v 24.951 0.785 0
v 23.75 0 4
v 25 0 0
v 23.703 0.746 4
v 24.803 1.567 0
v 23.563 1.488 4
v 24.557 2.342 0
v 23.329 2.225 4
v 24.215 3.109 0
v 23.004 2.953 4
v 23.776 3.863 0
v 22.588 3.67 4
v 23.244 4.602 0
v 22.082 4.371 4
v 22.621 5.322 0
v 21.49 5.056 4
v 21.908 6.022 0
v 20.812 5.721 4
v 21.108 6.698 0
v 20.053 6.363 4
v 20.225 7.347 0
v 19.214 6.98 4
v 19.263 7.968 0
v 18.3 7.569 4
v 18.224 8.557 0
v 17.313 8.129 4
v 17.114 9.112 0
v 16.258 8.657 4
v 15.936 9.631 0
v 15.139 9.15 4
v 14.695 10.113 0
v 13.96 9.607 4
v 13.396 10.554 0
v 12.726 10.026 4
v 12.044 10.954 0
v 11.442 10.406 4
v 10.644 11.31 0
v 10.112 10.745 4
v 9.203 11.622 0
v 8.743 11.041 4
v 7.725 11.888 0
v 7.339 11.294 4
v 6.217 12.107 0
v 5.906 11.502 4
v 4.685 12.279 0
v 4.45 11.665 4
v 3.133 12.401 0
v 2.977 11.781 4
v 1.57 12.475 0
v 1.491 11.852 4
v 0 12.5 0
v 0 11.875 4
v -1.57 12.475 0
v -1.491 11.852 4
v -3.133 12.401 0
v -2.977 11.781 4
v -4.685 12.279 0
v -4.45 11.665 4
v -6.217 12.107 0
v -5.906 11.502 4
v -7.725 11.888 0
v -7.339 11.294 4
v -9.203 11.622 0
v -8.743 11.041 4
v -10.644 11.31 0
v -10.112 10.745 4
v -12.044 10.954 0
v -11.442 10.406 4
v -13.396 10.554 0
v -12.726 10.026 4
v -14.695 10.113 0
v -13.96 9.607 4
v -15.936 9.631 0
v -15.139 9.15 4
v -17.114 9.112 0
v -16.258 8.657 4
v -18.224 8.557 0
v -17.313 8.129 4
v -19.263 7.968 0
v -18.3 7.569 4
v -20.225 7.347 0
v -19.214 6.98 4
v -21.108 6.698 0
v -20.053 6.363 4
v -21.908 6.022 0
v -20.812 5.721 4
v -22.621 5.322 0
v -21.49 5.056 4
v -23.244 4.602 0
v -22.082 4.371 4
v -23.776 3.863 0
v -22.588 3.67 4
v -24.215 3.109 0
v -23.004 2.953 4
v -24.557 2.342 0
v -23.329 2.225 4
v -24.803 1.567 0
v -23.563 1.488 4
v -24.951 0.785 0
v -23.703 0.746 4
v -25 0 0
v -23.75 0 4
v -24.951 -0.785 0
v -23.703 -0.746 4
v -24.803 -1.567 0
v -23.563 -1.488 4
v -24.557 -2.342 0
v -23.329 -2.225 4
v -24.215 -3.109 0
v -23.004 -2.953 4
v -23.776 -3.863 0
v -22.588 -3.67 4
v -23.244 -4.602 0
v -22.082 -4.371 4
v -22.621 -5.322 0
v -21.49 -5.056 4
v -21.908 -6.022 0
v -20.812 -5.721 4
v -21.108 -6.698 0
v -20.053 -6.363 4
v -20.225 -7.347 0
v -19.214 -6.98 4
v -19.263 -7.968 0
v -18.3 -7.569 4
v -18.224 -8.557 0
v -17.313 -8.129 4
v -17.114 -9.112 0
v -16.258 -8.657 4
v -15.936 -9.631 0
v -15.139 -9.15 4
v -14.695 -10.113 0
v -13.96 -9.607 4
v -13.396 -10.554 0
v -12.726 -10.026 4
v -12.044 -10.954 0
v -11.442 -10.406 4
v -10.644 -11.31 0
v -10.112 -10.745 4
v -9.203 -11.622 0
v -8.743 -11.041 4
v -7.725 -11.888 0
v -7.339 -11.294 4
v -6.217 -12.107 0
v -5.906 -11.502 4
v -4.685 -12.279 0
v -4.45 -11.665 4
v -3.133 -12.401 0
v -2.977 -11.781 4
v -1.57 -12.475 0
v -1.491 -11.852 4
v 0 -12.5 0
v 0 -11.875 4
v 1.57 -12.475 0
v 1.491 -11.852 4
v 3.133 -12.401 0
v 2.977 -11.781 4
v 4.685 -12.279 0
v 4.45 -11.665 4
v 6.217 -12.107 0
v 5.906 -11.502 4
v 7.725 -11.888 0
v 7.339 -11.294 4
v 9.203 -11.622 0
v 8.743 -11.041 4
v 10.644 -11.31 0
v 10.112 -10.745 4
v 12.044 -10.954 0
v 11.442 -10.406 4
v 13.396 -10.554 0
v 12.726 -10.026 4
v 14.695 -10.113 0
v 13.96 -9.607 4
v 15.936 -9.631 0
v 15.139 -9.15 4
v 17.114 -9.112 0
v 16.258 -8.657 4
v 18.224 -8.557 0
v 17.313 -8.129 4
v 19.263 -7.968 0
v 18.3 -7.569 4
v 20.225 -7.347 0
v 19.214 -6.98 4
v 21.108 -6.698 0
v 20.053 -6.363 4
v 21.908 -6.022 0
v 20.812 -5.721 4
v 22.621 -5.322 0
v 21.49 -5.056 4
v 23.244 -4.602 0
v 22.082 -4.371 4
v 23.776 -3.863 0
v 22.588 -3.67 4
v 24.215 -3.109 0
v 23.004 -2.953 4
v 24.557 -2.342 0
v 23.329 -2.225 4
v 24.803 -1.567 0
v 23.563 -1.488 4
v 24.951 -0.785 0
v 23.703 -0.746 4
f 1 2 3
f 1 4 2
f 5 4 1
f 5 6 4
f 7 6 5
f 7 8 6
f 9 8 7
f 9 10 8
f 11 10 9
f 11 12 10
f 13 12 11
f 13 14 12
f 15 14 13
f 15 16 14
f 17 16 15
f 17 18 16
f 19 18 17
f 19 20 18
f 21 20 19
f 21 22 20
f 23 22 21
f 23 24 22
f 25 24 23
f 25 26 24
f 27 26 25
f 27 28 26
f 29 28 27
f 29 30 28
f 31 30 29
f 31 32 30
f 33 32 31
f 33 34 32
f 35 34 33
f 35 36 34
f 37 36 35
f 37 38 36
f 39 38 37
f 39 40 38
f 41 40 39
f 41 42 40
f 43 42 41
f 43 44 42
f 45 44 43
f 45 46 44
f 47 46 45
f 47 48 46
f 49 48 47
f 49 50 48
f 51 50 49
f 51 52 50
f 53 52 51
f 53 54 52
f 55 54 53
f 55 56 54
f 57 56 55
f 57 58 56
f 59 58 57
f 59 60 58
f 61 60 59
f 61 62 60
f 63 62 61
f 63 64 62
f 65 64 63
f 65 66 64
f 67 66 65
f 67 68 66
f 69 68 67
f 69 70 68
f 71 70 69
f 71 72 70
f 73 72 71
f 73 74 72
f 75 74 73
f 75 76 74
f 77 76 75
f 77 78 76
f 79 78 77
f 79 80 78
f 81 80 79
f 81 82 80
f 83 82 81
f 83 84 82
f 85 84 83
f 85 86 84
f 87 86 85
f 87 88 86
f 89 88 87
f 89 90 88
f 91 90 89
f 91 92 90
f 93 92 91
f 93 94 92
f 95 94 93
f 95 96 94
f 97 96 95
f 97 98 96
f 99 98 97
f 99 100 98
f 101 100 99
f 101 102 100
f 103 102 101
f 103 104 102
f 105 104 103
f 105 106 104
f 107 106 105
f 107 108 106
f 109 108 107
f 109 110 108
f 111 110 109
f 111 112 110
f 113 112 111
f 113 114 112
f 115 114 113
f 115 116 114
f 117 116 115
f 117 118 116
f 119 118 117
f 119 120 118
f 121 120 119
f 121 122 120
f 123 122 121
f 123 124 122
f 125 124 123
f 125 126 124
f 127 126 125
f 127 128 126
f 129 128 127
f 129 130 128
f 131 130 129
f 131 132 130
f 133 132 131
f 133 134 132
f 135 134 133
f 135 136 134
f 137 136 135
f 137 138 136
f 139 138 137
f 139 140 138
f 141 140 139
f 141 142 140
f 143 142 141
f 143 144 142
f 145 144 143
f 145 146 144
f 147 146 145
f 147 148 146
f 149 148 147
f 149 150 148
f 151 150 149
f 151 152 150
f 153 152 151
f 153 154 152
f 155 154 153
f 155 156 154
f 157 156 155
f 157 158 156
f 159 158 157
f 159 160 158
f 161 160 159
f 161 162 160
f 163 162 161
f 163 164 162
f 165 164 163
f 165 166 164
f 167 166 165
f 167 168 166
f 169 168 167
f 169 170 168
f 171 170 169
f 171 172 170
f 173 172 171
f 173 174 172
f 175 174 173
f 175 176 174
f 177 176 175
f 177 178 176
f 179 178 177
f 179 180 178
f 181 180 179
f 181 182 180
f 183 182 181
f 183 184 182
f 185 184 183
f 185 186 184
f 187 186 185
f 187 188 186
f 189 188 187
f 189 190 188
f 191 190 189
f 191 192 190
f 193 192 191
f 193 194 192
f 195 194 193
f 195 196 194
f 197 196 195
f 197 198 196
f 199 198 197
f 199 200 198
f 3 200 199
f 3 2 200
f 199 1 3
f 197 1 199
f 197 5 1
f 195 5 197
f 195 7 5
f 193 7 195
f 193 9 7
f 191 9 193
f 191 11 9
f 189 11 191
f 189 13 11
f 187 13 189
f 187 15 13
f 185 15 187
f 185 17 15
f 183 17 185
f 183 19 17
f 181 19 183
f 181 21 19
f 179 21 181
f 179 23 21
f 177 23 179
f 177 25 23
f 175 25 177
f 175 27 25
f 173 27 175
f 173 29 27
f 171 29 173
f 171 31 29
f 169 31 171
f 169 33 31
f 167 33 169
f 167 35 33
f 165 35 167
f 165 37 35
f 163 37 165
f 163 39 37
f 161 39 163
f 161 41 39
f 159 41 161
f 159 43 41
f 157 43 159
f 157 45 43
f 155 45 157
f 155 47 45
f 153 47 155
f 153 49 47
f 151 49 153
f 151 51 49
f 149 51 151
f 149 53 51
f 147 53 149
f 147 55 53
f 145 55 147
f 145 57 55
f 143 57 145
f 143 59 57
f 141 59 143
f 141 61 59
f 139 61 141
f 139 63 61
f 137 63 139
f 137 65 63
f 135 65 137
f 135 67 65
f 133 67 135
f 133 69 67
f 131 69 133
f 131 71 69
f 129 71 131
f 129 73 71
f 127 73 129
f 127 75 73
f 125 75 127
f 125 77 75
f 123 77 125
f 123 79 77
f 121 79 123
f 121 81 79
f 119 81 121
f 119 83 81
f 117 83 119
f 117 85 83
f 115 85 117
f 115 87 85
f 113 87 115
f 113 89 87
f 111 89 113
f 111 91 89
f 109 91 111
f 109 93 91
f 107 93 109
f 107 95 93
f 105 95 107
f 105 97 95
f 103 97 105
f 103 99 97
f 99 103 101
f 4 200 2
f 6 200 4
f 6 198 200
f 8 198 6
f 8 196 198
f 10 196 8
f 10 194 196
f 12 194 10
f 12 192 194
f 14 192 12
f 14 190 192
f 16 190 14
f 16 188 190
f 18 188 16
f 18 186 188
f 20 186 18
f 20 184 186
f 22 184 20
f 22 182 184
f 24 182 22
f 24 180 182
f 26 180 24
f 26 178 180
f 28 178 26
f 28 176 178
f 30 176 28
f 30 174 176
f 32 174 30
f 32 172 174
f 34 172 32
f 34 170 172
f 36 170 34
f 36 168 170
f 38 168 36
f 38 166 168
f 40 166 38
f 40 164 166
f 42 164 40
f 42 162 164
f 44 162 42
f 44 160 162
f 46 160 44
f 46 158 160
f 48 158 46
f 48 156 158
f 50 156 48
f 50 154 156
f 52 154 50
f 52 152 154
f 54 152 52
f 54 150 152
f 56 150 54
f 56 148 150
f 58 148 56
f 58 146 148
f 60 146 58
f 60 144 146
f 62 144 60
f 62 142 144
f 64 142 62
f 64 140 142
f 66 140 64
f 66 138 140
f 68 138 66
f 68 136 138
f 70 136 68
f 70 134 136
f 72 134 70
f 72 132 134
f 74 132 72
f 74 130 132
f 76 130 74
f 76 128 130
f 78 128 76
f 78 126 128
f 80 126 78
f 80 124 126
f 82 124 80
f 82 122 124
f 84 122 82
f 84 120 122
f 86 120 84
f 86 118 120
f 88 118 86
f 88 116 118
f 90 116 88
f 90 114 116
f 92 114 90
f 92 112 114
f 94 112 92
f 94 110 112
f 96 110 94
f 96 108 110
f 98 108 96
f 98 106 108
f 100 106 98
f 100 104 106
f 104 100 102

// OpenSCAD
// file: ../build.scad
$build_id = "";

function building(filename) = is_undef(filename) ?
  !is_undef(build)
  : !is_undef(build) && build == filename;

function previewing() = !building();

module build(filename) {
  $build_id = filename;

  if(!is_undef(scad_build_scan) && scad_build_scan == true) {
    echo(str("scad_build_scan: ", filename));
  }
  else if(previewing() || build == filename) {
    children();
  }
}

module preview_row(spacing) {
  if(previewing()) {
    for(x = [0:1:$children - 1]) {
      translate([x * spacing, 0, 0]) {
        children(x);
      }
    }
  }
  else {
    children();
  }
}

module preview_column(spacing) {
  if(previewing()) {
    for(y = [0:1:$children - 1]) {
      translate([0, y * spacing, 0]) {
        children(y);
      }
    }
  }
  else {
    children();
  }
}
// file: ../minibase.scad
// Based off of titancraft's Customizable Miniature Base (CC0 1.0)
// https://www.thingiverse.com/thing:1112237

include <./build.scad>

$base_rim = 1; //	[1: tapered, 2: inclined, 3: flat]
// Number of sides:
$base_shape = 100; //	[30:Low-res Circle, 100: Hi-res Circle, 5:Pentagon, 6:Hexagon, 8:Octagon, 4:Square, 3:Triangle]

$base_diameter = 32;
$base_height = 4;
$base_slant = 95;

// Percentage:
$base_stretch = 100;

//(tapered base only)
$base_inner_circle_ratio = 40;

module tapered(r=40) {
  $base_rim = 1;
  $base_inner_circle_ratio = r;

  children();
}

module inclined() {
  $base_rim = 2;

  children();
}

module flat() {
  $base_rim = 3;

  children();
}

module shape(s) {
  $base_shape = s;

  children();
}

module diameter(d) {
  $base_diameter = d;

  children();
}

module height(h) {
  $base_height = h;

  children();
}

module slant(s) {
  $base_slant = s;

  children();
}

module stretch(s) {
  $base_stretch = s;

  children();
}

module base(id) {
  build(id) union() {
    radius = $base_diameter/2;
    scale([$base_stretch/100, 1, 1]){
      if ($base_rim == 1){
        // tapered base
        cyl1_height = $base_height * (1-$base_inner_circle_ratio/100);
        cylinder(cyl1_height, radius, radius * $base_slant/100, $fn=$base_shape);

        cyl2_radius = radius  * $base_slant/100 * .95;
        cyl2_height = $base_height - cyl1_height;

        translate([0, 0, cyl1_height]){
          cylinder(cyl2_height, cyl2_radius, cyl2_radius * $base_slant/100, $fn=$base_shape);
          cylinder(cyl2_height*.5, radius * $base_slant/100, cyl2_radius, $fn=$base_shape);
        }
      } else if ($base_rim == 2){
        // inclined base
        cylinder($base_height, radius, radius * $base_slant/100, $fn=$base_shape);
      } else if ($base_rim == 3){
        // flat base

        cylinder($base_height, radius, radius, $fn=$base_shape);
      }
    }
  }
}
// main file
include <../minibase.scad>

inclined() diameter(25) stretch(200) base("25x50mm-oprgw-cavalry");
